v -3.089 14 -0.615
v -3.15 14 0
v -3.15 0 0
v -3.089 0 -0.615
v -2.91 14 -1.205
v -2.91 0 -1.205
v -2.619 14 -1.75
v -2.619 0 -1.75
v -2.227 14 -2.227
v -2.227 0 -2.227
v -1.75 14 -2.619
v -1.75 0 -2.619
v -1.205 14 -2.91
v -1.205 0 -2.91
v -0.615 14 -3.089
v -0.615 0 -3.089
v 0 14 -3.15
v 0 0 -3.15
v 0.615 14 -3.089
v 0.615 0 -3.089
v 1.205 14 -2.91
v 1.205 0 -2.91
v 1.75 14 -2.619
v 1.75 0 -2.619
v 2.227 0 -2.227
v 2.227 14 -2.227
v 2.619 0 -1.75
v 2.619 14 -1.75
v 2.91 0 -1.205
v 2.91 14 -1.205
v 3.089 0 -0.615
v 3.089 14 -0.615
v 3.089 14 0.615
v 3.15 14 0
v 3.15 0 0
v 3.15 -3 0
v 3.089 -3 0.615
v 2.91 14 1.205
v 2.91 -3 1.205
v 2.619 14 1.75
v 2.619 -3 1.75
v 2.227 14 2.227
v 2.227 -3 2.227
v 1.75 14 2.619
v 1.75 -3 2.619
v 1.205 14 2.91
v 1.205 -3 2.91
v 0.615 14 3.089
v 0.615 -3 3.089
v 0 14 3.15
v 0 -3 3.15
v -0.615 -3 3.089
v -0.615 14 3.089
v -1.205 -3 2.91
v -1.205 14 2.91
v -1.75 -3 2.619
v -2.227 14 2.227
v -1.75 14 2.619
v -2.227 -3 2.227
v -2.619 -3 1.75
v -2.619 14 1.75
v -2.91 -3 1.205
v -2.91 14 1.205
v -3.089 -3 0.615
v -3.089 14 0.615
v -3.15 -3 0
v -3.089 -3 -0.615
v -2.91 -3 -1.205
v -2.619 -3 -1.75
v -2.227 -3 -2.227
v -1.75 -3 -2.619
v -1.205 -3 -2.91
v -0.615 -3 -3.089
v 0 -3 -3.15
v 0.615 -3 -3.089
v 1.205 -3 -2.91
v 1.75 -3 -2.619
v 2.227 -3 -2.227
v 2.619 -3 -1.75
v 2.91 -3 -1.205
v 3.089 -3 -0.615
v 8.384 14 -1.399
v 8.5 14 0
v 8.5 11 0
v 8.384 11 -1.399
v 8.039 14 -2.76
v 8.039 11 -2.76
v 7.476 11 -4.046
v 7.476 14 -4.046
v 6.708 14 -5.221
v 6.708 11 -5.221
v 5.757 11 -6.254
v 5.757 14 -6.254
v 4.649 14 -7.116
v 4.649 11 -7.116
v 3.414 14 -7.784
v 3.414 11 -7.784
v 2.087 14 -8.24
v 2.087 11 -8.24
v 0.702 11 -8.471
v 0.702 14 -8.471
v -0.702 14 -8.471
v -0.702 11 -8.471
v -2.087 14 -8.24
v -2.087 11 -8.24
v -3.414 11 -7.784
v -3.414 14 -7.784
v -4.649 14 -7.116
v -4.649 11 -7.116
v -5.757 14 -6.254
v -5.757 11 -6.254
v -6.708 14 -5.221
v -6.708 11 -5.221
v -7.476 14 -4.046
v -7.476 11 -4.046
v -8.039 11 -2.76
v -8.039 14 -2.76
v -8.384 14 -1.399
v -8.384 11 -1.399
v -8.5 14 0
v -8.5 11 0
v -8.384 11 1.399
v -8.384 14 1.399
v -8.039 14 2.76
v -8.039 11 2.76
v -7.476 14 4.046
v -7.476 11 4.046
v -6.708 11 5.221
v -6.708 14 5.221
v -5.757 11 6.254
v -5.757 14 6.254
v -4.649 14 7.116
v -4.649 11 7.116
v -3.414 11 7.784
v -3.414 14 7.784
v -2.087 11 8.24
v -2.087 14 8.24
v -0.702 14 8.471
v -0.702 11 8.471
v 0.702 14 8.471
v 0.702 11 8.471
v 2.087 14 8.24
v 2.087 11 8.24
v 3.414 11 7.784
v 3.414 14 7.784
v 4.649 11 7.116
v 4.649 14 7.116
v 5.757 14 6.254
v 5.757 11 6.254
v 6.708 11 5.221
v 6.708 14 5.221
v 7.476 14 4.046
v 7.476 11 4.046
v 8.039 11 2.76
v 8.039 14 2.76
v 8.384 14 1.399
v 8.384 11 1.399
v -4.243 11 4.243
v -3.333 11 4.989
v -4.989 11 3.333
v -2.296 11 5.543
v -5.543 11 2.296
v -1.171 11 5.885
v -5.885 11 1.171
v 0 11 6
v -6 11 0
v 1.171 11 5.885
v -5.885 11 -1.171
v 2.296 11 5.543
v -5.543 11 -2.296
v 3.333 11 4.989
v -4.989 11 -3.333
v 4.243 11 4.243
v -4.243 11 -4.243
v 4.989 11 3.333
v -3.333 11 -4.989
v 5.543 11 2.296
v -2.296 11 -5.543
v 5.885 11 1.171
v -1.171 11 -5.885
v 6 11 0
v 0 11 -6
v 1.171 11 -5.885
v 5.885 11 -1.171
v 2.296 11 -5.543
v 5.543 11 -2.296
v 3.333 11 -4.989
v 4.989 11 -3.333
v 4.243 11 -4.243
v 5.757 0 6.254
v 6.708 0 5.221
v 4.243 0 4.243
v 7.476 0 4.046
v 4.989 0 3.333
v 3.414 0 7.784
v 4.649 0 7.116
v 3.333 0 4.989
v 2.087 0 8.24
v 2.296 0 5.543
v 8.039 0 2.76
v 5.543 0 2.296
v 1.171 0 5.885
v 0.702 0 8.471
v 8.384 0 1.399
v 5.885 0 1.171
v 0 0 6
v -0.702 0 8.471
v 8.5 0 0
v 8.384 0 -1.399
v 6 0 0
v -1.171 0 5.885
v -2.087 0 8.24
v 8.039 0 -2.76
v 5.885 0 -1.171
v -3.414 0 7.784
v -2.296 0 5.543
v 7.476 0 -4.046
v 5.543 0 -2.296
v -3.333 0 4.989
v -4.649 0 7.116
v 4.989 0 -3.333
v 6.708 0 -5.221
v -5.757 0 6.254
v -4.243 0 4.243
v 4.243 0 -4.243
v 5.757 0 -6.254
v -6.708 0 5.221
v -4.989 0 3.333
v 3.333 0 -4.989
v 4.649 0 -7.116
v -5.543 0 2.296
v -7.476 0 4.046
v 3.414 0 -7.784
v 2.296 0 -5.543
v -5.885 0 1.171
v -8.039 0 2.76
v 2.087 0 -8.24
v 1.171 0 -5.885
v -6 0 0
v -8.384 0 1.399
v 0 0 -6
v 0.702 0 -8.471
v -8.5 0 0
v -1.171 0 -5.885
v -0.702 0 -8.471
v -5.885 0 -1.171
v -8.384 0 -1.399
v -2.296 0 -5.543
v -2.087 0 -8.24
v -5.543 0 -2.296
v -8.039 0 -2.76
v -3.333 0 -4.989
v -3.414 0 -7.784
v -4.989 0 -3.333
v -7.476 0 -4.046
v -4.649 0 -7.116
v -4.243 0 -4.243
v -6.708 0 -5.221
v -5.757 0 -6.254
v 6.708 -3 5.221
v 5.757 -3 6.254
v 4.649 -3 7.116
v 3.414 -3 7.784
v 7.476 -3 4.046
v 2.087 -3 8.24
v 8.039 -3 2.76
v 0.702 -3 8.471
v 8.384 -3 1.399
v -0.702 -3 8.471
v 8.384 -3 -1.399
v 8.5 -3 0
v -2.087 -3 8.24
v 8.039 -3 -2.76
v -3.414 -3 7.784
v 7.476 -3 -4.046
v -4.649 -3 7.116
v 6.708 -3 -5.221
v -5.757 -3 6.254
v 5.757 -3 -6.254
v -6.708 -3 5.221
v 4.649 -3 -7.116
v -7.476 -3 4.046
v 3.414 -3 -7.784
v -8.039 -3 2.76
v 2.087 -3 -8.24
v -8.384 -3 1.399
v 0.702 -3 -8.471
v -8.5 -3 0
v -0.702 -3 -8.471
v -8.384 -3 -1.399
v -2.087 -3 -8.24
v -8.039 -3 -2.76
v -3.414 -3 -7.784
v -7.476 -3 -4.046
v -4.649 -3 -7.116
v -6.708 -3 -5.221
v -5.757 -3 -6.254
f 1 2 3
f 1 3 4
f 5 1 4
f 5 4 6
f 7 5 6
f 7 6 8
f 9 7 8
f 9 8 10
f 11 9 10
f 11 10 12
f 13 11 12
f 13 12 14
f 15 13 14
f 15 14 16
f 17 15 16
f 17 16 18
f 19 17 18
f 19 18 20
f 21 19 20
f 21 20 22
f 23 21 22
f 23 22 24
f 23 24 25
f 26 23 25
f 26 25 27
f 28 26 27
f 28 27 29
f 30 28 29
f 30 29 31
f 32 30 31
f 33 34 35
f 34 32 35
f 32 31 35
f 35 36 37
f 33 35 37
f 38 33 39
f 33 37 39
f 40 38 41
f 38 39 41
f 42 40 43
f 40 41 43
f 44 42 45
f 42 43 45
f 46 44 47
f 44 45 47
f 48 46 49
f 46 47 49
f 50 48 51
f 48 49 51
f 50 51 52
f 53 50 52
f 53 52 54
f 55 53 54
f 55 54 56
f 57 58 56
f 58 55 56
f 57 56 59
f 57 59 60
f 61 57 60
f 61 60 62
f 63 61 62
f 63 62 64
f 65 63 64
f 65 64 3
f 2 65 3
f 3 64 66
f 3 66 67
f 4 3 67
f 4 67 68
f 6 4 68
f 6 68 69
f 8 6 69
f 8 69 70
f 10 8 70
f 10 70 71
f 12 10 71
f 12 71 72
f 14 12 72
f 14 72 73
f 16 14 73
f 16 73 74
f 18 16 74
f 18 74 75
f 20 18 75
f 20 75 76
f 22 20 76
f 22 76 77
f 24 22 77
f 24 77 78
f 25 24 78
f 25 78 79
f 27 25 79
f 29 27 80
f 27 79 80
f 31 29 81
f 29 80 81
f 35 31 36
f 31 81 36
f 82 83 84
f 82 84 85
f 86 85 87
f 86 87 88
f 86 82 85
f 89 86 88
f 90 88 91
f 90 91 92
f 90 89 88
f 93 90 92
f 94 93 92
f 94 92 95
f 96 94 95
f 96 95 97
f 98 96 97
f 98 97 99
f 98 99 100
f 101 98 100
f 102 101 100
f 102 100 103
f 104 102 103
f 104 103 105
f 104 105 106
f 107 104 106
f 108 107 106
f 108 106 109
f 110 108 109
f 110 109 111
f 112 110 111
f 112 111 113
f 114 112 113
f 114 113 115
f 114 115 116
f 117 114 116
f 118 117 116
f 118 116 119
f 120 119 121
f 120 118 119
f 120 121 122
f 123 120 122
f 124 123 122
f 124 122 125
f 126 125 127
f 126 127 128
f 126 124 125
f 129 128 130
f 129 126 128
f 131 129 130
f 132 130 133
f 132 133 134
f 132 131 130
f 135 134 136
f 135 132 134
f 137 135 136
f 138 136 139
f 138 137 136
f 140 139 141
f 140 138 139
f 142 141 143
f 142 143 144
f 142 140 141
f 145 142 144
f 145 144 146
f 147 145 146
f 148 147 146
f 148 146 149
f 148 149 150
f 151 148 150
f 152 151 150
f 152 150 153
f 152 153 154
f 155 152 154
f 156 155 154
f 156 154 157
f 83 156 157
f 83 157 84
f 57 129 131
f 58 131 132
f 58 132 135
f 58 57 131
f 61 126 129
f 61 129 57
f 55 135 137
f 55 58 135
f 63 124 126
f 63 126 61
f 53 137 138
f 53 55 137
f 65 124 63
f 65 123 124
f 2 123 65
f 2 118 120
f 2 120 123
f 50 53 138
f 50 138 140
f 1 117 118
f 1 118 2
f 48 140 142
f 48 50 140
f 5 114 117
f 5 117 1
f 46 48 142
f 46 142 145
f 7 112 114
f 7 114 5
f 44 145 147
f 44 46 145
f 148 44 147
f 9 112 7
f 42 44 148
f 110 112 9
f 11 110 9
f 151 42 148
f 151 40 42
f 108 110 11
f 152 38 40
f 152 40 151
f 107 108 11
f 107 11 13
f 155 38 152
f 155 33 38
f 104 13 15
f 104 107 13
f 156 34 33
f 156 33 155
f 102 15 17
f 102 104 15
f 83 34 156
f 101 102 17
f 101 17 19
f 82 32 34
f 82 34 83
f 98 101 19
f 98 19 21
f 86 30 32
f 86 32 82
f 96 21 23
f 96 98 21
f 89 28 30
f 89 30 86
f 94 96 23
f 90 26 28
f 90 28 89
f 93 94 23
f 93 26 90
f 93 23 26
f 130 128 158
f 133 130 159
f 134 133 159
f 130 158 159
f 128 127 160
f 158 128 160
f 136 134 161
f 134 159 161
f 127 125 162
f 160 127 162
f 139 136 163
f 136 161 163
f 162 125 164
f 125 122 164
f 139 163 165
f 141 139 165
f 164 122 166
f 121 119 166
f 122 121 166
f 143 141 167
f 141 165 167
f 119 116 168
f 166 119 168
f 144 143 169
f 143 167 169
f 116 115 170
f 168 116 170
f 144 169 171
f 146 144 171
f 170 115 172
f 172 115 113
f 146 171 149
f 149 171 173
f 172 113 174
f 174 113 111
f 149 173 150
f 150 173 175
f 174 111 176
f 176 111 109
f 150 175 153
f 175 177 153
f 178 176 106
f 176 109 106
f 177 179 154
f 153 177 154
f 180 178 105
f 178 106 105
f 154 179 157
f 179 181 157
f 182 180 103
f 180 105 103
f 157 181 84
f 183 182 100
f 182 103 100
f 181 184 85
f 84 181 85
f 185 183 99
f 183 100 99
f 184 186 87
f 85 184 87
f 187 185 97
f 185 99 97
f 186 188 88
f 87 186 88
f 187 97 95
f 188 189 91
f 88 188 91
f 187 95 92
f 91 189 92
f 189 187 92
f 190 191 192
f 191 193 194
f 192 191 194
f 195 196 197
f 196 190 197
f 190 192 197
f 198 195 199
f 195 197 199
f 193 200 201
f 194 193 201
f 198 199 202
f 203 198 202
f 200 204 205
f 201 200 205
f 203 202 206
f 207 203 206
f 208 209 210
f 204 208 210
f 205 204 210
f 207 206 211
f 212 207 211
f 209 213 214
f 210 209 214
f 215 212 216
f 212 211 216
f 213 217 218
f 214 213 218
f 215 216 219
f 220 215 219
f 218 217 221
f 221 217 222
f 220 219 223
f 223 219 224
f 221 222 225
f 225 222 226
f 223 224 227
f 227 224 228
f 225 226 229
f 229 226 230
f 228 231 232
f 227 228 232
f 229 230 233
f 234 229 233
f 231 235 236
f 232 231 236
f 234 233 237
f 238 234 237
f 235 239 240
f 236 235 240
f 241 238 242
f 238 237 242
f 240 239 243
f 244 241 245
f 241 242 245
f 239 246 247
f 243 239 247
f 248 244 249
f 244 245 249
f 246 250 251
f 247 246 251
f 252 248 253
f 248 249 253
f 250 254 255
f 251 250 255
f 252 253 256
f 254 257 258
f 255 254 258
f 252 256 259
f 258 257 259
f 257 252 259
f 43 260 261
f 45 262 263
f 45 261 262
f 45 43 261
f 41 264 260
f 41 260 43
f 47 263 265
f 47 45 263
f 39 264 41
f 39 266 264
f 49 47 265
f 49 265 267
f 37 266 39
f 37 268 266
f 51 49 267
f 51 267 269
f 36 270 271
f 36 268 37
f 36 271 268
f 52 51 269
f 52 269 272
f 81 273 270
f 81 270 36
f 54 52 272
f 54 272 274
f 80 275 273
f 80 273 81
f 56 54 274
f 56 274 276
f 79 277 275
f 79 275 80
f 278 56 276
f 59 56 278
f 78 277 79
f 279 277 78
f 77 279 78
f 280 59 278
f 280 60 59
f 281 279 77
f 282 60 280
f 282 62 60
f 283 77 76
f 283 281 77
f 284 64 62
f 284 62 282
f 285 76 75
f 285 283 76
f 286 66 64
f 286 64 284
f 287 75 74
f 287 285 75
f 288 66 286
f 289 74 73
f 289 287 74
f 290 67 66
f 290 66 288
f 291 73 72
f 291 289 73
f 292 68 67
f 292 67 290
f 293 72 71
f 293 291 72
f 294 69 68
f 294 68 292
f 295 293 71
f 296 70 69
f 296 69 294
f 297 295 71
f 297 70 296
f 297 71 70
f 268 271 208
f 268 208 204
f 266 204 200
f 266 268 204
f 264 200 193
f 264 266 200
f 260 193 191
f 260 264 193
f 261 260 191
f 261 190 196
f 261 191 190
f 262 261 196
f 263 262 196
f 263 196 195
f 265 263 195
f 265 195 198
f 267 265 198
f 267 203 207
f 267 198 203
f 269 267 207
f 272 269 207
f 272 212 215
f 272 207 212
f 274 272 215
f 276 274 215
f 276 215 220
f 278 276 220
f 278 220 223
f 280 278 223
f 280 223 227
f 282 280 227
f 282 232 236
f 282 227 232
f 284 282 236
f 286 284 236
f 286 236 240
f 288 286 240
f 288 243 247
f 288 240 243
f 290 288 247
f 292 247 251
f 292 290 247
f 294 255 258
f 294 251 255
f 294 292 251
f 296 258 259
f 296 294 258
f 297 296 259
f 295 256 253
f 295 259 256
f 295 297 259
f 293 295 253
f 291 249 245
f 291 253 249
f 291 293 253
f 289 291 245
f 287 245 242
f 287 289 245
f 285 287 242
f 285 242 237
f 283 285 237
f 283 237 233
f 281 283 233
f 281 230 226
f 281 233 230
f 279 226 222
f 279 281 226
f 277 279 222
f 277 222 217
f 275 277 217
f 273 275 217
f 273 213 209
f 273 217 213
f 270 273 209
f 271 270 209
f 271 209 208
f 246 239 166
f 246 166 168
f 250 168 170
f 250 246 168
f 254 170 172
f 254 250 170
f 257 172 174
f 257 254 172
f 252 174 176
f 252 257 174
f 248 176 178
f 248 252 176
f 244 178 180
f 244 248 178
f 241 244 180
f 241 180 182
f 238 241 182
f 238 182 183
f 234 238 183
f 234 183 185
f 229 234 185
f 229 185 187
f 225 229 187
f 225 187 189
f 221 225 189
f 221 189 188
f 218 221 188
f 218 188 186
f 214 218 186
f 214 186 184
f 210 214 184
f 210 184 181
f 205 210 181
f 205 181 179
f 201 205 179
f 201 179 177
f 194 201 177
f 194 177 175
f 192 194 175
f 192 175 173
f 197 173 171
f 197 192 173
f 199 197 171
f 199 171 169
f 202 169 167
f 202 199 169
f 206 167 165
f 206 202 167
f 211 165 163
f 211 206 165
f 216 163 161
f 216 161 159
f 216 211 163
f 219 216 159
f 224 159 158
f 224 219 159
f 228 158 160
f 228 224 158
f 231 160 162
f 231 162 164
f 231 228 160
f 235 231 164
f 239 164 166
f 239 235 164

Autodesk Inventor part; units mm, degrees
ref_plane "YZ Plane" through (0, 0, 0) normal (1, 0, 0) x (0, 1, 0)
ref_plane "XZ Plane" through (0, 0, 0) normal (0, 1, 0) x (-1, 0, 0)
ref_plane "XY Plane" through (0, 0, 0) normal (0, 0, 1) x (1, 0, 0)
sketch "Sketch1" plane through (0, 0, 0) normal (0, 1, 0) x (-1, 0, 0)
  circle A0 centre (0, 0) radius 3.15
  circle A1 centre (0, 0) radius 6
  dimension "d0" = 6.3
  dimension "d2" = 12
extrude "Extrusion1" add sketch "Sketch1" along normal blind 14
sketch "Sketch2" plane through (0, 14, 0) normal (0, 1, 0) x (1, 0, 0)
  circle A0 centre (0, 0) radius 2.6288
  circle A1 centre (0, 0) radius 3.15 projected
  circle A2 centre (0, 0) radius 8.5
  dimension "d5" = 17
extrude "Extrusion2" add sketch "Sketch2" against normal blind 3 contours A2
ref_plane "Work Plane1" through (0, 5.5, 0) normal (0, -1, 0) x (1, 0, 0)
mirror "Mirror1" about plane through (0, 5.5, 0) normal (0, -1, 0) of "Extrusion2"
ref_plane "Work Plane2" through (0, 5.5, 0) normal (0, -1, 0) x (1, 0, 0)
properties part number "Belt tensor2"
